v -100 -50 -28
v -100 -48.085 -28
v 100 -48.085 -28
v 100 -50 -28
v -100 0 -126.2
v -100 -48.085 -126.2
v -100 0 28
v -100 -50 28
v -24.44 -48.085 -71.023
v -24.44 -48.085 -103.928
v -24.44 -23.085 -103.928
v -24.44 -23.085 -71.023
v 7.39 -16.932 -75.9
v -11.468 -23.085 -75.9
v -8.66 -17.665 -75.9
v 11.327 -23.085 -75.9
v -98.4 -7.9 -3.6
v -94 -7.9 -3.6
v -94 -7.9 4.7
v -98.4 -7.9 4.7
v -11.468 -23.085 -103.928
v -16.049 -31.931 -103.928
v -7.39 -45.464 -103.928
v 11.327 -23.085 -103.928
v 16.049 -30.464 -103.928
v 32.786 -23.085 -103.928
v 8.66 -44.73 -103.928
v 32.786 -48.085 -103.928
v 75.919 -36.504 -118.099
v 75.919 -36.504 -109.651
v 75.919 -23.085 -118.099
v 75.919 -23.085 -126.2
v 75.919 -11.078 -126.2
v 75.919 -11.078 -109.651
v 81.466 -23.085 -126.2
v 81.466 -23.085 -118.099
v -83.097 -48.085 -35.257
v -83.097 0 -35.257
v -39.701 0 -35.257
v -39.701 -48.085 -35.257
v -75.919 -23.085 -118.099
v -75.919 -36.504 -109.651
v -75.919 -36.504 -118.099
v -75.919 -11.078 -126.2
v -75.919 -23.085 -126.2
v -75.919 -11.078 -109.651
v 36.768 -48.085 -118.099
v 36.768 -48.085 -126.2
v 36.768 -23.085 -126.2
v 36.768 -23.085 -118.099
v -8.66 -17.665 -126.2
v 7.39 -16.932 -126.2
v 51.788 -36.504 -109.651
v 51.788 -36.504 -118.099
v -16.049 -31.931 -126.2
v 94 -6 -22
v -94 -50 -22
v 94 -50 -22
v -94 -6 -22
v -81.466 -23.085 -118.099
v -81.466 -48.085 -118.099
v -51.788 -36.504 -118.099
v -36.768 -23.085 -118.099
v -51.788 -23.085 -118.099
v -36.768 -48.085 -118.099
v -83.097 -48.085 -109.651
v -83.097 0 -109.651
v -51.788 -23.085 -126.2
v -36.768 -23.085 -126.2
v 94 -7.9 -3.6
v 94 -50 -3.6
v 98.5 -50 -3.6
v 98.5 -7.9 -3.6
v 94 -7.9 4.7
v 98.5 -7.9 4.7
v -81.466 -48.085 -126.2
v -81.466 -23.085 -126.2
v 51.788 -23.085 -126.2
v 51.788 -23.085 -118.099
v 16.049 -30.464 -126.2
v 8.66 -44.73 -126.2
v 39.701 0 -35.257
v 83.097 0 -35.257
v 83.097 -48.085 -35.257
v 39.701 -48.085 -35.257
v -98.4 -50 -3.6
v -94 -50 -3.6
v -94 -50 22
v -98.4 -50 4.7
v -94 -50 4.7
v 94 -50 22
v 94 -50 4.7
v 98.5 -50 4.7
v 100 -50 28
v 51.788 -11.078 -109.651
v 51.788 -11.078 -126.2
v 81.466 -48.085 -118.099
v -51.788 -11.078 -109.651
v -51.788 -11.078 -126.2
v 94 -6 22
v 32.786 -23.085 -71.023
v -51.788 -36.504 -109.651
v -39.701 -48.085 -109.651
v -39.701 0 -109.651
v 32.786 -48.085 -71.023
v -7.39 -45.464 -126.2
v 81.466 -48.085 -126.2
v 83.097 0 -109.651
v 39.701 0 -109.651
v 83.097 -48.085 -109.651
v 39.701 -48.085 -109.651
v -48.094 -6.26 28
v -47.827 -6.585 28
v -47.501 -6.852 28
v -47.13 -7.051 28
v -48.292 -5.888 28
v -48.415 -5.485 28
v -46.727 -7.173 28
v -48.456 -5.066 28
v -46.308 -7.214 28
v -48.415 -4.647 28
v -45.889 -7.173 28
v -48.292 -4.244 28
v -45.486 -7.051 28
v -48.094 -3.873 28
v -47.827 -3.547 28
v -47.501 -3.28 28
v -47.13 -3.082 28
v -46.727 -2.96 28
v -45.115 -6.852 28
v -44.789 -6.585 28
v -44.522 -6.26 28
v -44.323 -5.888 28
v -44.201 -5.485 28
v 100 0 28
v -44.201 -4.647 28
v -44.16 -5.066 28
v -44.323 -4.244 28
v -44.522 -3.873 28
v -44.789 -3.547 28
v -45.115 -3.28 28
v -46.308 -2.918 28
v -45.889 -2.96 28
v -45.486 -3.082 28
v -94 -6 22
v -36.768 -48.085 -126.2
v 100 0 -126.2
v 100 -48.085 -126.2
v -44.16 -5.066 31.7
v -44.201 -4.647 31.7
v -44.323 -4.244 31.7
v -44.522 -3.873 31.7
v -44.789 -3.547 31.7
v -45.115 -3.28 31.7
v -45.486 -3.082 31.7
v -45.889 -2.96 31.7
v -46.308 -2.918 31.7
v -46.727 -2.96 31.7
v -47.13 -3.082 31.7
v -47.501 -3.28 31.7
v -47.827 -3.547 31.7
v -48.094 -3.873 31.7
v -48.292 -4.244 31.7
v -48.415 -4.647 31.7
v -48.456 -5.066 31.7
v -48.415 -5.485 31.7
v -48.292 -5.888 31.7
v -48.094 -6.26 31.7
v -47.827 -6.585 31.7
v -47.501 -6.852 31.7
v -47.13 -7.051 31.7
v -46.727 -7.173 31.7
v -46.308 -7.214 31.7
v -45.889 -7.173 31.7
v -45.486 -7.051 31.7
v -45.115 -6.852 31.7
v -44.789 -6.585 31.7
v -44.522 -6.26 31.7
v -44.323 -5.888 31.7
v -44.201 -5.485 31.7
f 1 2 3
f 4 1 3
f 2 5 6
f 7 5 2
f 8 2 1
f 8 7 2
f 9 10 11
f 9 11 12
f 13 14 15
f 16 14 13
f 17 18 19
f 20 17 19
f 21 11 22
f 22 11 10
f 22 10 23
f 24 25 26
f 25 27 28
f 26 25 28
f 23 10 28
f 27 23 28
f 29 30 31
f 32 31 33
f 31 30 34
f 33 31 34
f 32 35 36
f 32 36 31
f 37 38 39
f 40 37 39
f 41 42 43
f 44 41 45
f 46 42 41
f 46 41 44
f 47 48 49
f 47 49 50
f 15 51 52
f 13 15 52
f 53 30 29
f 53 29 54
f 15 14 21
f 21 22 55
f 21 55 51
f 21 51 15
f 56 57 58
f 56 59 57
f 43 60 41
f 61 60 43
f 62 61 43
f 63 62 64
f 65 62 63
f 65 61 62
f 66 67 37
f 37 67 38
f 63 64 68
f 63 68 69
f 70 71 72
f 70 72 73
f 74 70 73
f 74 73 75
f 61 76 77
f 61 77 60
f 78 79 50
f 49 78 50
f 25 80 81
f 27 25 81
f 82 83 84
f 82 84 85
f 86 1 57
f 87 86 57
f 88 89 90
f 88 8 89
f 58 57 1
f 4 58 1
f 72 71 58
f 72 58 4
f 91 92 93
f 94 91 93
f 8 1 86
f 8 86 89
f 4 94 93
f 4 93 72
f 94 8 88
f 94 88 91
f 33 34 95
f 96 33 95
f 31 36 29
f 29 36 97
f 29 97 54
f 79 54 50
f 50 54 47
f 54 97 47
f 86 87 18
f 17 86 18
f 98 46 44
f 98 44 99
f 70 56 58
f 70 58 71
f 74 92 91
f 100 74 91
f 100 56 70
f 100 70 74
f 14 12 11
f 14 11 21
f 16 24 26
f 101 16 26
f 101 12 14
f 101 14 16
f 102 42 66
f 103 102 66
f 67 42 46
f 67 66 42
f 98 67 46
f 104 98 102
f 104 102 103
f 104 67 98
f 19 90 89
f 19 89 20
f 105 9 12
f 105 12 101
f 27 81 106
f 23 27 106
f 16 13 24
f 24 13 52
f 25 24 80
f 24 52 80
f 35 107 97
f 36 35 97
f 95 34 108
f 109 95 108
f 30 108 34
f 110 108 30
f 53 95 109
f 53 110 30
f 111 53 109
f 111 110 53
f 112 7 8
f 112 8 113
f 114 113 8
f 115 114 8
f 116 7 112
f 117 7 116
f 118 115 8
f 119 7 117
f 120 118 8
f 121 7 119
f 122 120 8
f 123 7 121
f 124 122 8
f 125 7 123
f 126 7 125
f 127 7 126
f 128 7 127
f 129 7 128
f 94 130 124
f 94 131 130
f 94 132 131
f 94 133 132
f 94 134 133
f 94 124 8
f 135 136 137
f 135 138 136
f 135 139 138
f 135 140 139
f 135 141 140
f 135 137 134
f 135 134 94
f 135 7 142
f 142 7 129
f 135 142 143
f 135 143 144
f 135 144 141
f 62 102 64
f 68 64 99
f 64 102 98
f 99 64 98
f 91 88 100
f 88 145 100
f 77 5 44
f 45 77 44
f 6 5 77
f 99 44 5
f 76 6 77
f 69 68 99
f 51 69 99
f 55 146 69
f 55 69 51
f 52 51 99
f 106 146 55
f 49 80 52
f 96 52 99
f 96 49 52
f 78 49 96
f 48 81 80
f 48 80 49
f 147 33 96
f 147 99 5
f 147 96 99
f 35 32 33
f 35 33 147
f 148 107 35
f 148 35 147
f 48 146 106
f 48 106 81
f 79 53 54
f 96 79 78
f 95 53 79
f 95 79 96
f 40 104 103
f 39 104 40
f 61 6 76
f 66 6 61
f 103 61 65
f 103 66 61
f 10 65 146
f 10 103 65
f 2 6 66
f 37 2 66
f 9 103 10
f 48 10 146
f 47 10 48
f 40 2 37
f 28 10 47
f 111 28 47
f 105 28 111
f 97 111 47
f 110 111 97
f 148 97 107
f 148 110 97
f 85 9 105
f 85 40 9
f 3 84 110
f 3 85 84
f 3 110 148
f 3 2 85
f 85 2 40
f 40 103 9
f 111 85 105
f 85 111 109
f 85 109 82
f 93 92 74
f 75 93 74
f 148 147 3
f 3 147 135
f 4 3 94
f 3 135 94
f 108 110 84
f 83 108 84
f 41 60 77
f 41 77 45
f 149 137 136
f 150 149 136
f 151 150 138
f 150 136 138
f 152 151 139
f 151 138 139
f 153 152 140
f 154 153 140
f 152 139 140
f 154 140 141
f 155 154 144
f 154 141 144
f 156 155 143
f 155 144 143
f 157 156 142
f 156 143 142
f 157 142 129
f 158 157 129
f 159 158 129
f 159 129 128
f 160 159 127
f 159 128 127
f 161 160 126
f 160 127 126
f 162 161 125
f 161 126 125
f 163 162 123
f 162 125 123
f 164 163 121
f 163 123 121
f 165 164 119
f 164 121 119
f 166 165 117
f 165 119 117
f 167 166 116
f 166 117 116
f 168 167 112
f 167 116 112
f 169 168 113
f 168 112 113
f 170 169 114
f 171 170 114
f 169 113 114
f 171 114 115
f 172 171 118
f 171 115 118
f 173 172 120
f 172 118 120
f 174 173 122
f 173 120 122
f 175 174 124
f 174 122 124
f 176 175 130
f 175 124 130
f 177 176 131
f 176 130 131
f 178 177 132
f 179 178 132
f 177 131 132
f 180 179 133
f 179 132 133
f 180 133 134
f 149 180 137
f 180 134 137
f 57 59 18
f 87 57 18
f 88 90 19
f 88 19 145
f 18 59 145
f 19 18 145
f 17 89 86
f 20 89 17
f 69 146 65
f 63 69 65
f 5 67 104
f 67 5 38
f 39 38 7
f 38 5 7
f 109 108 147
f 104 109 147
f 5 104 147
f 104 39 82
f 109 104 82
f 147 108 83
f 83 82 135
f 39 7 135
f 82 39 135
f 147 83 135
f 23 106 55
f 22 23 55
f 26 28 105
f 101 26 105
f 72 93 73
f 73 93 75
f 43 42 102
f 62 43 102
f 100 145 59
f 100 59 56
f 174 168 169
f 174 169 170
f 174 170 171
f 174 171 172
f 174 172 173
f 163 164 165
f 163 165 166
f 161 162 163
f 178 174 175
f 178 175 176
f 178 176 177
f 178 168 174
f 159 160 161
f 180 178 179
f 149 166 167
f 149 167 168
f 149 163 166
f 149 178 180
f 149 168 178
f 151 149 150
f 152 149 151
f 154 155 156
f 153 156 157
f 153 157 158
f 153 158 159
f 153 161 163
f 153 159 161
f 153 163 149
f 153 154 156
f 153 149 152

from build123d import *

# Parameters (mm, degrees)
F0_W           = 200
F0_H           = 56
F1_DEPTH       = 50
F2_T           = -6
F3_W           = 149.0980237722
F3_H           = 8.3
F4_DEPTH       = 98.5
F4_DEPTH_BACK  = 98.4
F5_R           = 2.1479446761
F6_DEPTH       = 3.7
F7_W           = 200
F7_H           = 48.0854995549
F8_DEPTH       = 98.2
F9_W           = 44.6983203292
F9_H           = 8.100832057
F10_DEPTH      = 25
F11_W          = 43.396525085
F11_H          = 74.3940398097
F12_DEPTH      = 55.1
F12_DEPTH_BACK = 75
F13_W          = 24.1317078471
F13_H          = 25.4259835929
F14_DEPTH      = 29.4
F16_DEPTH      = 50.3
F17_W          = 57.2261828929
F17_H          = 32.9050645232
F18_DEPTH      = 25


# Not quite as in the source:
# - a pattern or mirror of a feature is missing from the dataset's text; its kind, count and spacing are read off the source's solid


with BuildPart() as f1:
    # F0 (on Front) → F1 (new body)
    with BuildSketch(Plane.XZ):
        Rectangle(F0_W, F0_H)
    extrude(amount=F1_DEPTH)

    # F2
    f2_openings = [f1.faces().sort_by_distance(p)[0] for p in [
        (0, -50, 0),
    ]]
    offset(amount=F2_T, openings=f2_openings)

    # F3 (on Right) → F4 (cut, two sides)
    with BuildSketch(Plane.YZ) as f4_sk:
        with Locations((-82.4490264058, 0.55)):
            Rectangle(F3_W, F3_H)
    extrude(amount=F4_DEPTH, mode=Mode.SUBTRACT)
    extrude(f4_sk.sketch, amount=-F4_DEPTH_BACK, mode=Mode.SUBTRACT)

    # F5 (on face) → F6 (join)
    with BuildSketch(Plane.XY.offset(28)):
        with Locations((-46.3078469038, -5.0663095899)):
            Circle(F5_R)
    extrude(amount=F6_DEPTH)

    # F7 (on face) → F8 (join)
    with BuildSketch(Plane(origin=(0, 0, -28), x_dir=(1, 0, 0), z_dir=(0, 0, -1))):
        with Locations((0, 24.0427497774)):
            Rectangle(F7_W, F7_H)
    extrude(amount=F8_DEPTH)

    # F9 (on face) → F10 (cut)
    with BuildSketch(Plane.XZ.offset(48.0854995549)):
        with Locations((-59.1169446707, -122.1495839715)):
            Rectangle(F9_W, F9_H)
    f10 = extrude(amount=-F10_DEPTH, mode=Mode.SUBTRACT)

    # F10_copies: F10 across plane
    add(f10.mirror(Plane(origin=(0, 0, 0), x_dir=(0, 0, 1), z_dir=(1, 0, 0))), mode=Mode.SUBTRACT)

    # F11 (on Front) → F12 (cut, two sides)
    with BuildSketch(Plane.XZ) as f12_sk:
        with Locations((-61.3989308476, -72.4539384246)):
            Rectangle(F11_W, F11_H)
    f12 = extrude(amount=-F12_DEPTH, mode=Mode.SUBTRACT) + extrude(f12_sk.sketch, amount=F12_DEPTH_BACK, mode=Mode.SUBTRACT)

    # F12_copies: F12 across plane
    add(f12.mirror(Plane(origin=(0, 0, 0), x_dir=(0, 0, 1), z_dir=(1, 0, 0))), mode=Mode.SUBTRACT)

    # F13 (on face) → F14 (cut)
    with BuildSketch(Plane.XY.offset(-109.6509583294)):
        with Locations((-63.8535097241, -23.7910989672)):
            Rectangle(F13_W, F13_H)
    f14 = extrude(amount=-F14_DEPTH, mode=Mode.SUBTRACT)

    # F14_copies: F14 across plane
    add(f14.mirror(Plane(origin=(0, 0, 0), x_dir=(0, 0, 1), z_dir=(1, 0, 0))), mode=Mode.SUBTRACT)

    # F15 (on face) → F16 (cut)
    with BuildSketch(Plane(origin=(0, 0, -126.2), x_dir=(1, 0, 0), z_dir=(0, 0, -1))):
        Polygon((16.0494638515, 30.4643716825), (8.6599005478, 44.7303298699), (-7.3895633037, 45.4637594198), (-16.0494638515, 31.9312307822), (-8.6599005478, 17.6652725948), (7.3895633037, 16.9318430449), align=None)
    extrude(amount=-F16_DEPTH, mode=Mode.SUBTRACT)

    # F17 (on face) → F18 (cut)
    with BuildSketch(Plane.XZ.offset(48.0854995549)):
        with Locations((4.1727414355, -87.4758176506)):
            Rectangle(F17_W, F17_H)
    extrude(amount=-F18_DEPTH, mode=Mode.SUBTRACT)


solid = f1.part
